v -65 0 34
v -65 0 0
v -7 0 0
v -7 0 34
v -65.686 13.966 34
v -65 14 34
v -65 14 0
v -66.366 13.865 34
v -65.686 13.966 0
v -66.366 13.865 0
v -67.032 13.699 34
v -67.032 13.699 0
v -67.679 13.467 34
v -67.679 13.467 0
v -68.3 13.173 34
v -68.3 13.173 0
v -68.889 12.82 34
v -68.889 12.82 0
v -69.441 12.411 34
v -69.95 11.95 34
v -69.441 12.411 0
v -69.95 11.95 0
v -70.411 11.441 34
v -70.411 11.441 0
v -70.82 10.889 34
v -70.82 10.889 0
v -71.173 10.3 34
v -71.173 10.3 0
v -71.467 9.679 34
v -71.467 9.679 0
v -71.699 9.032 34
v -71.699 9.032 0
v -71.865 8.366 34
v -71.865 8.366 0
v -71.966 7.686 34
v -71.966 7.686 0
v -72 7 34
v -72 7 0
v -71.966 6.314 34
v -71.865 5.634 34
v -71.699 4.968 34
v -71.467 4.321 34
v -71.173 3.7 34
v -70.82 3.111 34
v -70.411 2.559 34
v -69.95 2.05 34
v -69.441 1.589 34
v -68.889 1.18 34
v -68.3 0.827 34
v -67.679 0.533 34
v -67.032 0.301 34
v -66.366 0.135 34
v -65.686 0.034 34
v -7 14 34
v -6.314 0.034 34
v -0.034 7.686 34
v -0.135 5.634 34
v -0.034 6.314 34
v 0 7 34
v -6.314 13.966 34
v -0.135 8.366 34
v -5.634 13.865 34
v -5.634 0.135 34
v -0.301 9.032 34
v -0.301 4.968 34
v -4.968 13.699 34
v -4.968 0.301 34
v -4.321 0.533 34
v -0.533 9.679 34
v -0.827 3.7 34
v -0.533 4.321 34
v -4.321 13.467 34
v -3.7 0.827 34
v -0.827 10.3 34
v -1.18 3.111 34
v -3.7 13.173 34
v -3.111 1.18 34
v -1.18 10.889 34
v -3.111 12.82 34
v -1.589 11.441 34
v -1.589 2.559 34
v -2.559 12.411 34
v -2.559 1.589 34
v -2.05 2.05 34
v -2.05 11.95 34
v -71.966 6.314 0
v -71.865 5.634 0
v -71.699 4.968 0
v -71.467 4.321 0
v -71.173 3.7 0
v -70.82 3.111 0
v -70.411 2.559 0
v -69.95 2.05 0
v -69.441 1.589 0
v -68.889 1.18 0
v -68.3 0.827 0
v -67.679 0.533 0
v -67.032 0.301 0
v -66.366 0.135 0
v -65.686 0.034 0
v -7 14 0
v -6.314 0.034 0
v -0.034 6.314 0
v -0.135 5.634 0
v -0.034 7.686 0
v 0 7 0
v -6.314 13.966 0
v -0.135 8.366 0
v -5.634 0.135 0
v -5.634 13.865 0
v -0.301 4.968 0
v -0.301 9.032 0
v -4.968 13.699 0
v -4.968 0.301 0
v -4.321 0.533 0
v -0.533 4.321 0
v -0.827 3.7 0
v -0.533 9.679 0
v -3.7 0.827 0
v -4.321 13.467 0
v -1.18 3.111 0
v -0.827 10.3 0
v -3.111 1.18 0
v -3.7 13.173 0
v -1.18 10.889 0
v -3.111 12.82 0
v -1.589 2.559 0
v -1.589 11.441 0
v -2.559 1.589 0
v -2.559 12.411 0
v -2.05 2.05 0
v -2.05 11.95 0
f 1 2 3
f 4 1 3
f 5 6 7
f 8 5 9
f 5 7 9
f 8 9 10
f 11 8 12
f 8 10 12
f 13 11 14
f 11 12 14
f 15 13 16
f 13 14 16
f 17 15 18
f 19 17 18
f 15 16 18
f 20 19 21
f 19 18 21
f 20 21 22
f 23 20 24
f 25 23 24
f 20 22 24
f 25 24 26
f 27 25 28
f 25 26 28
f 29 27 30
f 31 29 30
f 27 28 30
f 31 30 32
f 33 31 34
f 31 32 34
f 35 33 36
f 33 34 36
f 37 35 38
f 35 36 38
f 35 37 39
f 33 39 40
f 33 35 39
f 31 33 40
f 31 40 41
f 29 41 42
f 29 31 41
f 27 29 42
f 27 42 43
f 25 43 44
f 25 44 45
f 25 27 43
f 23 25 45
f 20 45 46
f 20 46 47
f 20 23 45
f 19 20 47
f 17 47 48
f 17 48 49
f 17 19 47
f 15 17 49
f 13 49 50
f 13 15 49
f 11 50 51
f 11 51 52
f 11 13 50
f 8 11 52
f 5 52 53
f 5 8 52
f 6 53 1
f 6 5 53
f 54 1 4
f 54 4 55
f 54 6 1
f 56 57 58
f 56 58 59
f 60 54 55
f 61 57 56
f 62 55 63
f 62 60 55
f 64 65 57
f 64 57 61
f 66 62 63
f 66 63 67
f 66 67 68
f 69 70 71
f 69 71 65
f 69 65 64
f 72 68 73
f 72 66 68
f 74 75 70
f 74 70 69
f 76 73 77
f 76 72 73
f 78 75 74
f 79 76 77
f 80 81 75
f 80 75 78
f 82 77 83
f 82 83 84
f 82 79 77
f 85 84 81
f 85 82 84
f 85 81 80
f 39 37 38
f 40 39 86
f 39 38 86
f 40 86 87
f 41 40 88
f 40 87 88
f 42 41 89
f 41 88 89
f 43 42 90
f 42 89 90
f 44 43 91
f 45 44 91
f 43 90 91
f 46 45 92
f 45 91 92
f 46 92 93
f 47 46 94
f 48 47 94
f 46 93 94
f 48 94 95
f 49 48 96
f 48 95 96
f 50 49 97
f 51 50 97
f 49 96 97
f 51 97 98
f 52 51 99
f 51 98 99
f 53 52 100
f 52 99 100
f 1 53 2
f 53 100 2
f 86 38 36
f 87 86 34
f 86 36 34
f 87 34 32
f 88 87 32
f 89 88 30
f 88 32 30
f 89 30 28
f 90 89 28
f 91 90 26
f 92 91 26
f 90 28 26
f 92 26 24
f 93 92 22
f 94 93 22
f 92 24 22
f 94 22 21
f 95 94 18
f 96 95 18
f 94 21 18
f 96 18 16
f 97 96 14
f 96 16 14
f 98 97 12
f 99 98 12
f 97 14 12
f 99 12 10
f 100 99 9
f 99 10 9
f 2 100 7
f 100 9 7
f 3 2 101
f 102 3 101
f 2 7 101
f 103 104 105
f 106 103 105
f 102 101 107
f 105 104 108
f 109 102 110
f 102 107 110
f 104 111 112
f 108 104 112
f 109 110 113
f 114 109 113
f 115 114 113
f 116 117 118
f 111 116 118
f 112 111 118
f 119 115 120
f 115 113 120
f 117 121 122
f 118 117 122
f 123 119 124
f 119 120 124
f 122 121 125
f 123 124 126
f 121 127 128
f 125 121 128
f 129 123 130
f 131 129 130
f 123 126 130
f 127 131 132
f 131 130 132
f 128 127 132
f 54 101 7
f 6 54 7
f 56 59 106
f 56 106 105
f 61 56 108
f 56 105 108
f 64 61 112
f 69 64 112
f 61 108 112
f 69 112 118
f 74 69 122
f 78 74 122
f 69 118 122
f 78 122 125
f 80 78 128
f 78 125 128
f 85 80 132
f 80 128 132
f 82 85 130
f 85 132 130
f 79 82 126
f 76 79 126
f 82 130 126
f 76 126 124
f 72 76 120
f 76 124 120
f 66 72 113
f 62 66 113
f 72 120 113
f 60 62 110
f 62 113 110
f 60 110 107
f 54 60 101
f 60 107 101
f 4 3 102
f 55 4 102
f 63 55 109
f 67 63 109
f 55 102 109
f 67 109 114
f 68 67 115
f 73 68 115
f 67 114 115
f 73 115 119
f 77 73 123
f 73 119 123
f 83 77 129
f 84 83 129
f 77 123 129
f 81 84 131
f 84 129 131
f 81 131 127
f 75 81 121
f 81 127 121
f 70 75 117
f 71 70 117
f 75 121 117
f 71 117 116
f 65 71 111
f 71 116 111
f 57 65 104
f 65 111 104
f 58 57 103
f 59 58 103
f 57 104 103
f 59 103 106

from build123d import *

# Parameters (mm, degrees)
F1_DEPTH = 34


with BuildPart() as f1:
    # F0 (on Top) → F1 (new body)
    with BuildSketch(Plane.XY):
        with BuildLine():
            ThreePointArc((-72, 7), (-69.949747, 2.050253), (-65, 0))
            ThreePointArc((-65, 0), (-60.050253, 2.050253), (-58, 7))
            ThreePointArc((-58, 7), (-60.050253, 11.949747), (-65, 14))
            ThreePointArc((-65, 14), (-69.949747, 11.949747), (-72, 7))
        make_face()
        with BuildLine():
            Line((-65, 0), (-7, 0))
            ThreePointArc((-7, 0), (-14, 7), (-7, 14))
            Line((-7, 14), (-65, 14))
            ThreePointArc((-65, 14), (-60.050253, 11.949747), (-58, 7))
            ThreePointArc((-58, 7), (-60.050253, 2.050253), (-65, 0))
        make_face()
        with BuildLine():
            ThreePointArc((-7, 14), (-14, 7), (-7, 0))
            ThreePointArc((-7, 0), (-2.050253, 2.050253), (0, 7))
            ThreePointArc((0, 7), (-2.050253, 11.949747), (-7, 14))
        make_face()
    extrude(amount=F1_DEPTH)


solid = f1.part
